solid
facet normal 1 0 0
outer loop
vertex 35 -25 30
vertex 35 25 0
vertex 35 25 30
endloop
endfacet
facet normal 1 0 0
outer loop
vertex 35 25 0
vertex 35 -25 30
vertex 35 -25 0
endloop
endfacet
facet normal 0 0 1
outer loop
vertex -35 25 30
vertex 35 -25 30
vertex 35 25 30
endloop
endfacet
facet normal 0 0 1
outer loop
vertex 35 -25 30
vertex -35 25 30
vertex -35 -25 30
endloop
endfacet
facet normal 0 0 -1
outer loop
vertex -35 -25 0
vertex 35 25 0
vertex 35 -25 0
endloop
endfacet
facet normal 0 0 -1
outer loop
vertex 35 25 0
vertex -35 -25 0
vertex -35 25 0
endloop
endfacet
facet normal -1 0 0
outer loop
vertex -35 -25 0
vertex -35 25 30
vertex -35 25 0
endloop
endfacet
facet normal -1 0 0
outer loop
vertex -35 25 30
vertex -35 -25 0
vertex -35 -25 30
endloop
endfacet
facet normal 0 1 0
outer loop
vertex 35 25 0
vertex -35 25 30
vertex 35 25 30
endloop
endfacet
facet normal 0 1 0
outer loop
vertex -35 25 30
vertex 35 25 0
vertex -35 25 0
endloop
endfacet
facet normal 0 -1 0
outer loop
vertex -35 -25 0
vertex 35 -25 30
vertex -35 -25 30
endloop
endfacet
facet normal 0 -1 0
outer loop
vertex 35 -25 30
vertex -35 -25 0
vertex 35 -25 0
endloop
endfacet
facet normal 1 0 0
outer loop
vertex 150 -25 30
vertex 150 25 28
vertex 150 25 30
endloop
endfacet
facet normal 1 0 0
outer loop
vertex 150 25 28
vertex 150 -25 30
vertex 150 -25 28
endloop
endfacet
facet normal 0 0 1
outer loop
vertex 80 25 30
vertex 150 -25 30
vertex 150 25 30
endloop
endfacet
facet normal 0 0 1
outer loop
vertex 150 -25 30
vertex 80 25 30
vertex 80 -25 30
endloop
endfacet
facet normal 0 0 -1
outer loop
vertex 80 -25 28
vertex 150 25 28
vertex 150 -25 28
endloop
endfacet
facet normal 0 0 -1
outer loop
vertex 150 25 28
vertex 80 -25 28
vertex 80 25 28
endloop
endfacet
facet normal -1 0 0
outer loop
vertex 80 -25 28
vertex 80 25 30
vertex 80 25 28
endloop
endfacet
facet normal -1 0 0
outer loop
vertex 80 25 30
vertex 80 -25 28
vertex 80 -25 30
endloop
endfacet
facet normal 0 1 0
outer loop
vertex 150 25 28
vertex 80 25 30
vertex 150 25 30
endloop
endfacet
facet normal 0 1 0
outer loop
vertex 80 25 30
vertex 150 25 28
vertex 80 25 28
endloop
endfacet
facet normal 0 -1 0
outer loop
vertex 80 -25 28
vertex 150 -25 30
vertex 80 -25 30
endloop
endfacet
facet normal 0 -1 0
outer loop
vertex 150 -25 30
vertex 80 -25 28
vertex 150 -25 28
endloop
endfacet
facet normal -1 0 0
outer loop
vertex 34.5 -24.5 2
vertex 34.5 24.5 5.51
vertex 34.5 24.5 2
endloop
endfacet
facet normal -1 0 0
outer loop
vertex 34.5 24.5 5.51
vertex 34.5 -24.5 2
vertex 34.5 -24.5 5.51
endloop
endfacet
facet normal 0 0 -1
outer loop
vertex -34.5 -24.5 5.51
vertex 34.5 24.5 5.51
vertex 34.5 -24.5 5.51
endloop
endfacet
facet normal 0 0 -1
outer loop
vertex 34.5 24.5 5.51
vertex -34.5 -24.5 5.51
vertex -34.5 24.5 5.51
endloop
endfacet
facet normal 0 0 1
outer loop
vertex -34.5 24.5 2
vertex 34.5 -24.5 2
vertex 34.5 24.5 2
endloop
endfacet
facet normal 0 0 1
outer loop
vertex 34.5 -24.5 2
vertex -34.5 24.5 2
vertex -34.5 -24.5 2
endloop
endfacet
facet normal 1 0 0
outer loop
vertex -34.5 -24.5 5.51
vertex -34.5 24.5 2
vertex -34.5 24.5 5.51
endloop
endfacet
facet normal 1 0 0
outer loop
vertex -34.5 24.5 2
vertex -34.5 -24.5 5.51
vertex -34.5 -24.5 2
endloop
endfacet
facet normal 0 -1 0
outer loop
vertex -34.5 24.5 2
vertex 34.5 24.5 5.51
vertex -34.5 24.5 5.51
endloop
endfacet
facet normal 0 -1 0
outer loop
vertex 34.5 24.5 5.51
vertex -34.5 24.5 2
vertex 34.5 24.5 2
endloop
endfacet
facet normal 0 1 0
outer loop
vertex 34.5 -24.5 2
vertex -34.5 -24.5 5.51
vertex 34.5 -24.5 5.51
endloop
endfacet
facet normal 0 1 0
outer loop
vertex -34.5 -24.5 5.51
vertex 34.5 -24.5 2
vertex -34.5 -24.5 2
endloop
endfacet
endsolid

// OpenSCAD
// Two-part enclosure for small electronics board (e.g., Arduino-based logger)
// Print orientation: box standing on the bed, lid on top (overhangs OK)

$fn = 64;

// ---- Box (Part 1) ----
box_x   = 70;    // outer length (X)
box_y   = 50;    // outer width (Y)
box_z   = 30;    // outer height (Z)
box_w   = 2;     // wall thickness (X and Y)
box_f   = 2;     // floor thickness (Z)

// ---- Lid (Part 2) ----
lip_x   = 65.6;  // outer length of lip (X)
lip_y   = 45.6;  // outer width of lip (Y)
lip_w   = 1.5;   // lip wall thickness (Z)
lip_h   = 4;     // lip height above plate (Z)
plate_t = 2;     // plate thickness (Z)

// ---- Misc ----
gap     = 10;    // gap between box and lid (X)
eps     = 0.5;   // cutter overshoot

difference() {
    union() {
        // Box body (hollow)
        translate([-box_x/2, -box_y/2, 0])
            cube([box_x, box_y, box_z]);

        // Lid plate
        translate([box_x + gap, -box_y/2, box_z - plate_t])
            cube([box_x, box_y, plate_t]);

        // Lip on top of plate (overhangs into box opening)
        translate([box_x + gap, -lip_y/2, box_z - plate_t])
            cube([lip_x, lip_y, lip_w]);
    }

    // Box cavity (open top, extends above lid so the opening is clean)
    translate([-box_x/2 + eps, -box_y/2 + eps, box_f])
        cube([box_x - 2*eps, box_y - 2*eps, plate_t + lip_w + 0.01]);
}
